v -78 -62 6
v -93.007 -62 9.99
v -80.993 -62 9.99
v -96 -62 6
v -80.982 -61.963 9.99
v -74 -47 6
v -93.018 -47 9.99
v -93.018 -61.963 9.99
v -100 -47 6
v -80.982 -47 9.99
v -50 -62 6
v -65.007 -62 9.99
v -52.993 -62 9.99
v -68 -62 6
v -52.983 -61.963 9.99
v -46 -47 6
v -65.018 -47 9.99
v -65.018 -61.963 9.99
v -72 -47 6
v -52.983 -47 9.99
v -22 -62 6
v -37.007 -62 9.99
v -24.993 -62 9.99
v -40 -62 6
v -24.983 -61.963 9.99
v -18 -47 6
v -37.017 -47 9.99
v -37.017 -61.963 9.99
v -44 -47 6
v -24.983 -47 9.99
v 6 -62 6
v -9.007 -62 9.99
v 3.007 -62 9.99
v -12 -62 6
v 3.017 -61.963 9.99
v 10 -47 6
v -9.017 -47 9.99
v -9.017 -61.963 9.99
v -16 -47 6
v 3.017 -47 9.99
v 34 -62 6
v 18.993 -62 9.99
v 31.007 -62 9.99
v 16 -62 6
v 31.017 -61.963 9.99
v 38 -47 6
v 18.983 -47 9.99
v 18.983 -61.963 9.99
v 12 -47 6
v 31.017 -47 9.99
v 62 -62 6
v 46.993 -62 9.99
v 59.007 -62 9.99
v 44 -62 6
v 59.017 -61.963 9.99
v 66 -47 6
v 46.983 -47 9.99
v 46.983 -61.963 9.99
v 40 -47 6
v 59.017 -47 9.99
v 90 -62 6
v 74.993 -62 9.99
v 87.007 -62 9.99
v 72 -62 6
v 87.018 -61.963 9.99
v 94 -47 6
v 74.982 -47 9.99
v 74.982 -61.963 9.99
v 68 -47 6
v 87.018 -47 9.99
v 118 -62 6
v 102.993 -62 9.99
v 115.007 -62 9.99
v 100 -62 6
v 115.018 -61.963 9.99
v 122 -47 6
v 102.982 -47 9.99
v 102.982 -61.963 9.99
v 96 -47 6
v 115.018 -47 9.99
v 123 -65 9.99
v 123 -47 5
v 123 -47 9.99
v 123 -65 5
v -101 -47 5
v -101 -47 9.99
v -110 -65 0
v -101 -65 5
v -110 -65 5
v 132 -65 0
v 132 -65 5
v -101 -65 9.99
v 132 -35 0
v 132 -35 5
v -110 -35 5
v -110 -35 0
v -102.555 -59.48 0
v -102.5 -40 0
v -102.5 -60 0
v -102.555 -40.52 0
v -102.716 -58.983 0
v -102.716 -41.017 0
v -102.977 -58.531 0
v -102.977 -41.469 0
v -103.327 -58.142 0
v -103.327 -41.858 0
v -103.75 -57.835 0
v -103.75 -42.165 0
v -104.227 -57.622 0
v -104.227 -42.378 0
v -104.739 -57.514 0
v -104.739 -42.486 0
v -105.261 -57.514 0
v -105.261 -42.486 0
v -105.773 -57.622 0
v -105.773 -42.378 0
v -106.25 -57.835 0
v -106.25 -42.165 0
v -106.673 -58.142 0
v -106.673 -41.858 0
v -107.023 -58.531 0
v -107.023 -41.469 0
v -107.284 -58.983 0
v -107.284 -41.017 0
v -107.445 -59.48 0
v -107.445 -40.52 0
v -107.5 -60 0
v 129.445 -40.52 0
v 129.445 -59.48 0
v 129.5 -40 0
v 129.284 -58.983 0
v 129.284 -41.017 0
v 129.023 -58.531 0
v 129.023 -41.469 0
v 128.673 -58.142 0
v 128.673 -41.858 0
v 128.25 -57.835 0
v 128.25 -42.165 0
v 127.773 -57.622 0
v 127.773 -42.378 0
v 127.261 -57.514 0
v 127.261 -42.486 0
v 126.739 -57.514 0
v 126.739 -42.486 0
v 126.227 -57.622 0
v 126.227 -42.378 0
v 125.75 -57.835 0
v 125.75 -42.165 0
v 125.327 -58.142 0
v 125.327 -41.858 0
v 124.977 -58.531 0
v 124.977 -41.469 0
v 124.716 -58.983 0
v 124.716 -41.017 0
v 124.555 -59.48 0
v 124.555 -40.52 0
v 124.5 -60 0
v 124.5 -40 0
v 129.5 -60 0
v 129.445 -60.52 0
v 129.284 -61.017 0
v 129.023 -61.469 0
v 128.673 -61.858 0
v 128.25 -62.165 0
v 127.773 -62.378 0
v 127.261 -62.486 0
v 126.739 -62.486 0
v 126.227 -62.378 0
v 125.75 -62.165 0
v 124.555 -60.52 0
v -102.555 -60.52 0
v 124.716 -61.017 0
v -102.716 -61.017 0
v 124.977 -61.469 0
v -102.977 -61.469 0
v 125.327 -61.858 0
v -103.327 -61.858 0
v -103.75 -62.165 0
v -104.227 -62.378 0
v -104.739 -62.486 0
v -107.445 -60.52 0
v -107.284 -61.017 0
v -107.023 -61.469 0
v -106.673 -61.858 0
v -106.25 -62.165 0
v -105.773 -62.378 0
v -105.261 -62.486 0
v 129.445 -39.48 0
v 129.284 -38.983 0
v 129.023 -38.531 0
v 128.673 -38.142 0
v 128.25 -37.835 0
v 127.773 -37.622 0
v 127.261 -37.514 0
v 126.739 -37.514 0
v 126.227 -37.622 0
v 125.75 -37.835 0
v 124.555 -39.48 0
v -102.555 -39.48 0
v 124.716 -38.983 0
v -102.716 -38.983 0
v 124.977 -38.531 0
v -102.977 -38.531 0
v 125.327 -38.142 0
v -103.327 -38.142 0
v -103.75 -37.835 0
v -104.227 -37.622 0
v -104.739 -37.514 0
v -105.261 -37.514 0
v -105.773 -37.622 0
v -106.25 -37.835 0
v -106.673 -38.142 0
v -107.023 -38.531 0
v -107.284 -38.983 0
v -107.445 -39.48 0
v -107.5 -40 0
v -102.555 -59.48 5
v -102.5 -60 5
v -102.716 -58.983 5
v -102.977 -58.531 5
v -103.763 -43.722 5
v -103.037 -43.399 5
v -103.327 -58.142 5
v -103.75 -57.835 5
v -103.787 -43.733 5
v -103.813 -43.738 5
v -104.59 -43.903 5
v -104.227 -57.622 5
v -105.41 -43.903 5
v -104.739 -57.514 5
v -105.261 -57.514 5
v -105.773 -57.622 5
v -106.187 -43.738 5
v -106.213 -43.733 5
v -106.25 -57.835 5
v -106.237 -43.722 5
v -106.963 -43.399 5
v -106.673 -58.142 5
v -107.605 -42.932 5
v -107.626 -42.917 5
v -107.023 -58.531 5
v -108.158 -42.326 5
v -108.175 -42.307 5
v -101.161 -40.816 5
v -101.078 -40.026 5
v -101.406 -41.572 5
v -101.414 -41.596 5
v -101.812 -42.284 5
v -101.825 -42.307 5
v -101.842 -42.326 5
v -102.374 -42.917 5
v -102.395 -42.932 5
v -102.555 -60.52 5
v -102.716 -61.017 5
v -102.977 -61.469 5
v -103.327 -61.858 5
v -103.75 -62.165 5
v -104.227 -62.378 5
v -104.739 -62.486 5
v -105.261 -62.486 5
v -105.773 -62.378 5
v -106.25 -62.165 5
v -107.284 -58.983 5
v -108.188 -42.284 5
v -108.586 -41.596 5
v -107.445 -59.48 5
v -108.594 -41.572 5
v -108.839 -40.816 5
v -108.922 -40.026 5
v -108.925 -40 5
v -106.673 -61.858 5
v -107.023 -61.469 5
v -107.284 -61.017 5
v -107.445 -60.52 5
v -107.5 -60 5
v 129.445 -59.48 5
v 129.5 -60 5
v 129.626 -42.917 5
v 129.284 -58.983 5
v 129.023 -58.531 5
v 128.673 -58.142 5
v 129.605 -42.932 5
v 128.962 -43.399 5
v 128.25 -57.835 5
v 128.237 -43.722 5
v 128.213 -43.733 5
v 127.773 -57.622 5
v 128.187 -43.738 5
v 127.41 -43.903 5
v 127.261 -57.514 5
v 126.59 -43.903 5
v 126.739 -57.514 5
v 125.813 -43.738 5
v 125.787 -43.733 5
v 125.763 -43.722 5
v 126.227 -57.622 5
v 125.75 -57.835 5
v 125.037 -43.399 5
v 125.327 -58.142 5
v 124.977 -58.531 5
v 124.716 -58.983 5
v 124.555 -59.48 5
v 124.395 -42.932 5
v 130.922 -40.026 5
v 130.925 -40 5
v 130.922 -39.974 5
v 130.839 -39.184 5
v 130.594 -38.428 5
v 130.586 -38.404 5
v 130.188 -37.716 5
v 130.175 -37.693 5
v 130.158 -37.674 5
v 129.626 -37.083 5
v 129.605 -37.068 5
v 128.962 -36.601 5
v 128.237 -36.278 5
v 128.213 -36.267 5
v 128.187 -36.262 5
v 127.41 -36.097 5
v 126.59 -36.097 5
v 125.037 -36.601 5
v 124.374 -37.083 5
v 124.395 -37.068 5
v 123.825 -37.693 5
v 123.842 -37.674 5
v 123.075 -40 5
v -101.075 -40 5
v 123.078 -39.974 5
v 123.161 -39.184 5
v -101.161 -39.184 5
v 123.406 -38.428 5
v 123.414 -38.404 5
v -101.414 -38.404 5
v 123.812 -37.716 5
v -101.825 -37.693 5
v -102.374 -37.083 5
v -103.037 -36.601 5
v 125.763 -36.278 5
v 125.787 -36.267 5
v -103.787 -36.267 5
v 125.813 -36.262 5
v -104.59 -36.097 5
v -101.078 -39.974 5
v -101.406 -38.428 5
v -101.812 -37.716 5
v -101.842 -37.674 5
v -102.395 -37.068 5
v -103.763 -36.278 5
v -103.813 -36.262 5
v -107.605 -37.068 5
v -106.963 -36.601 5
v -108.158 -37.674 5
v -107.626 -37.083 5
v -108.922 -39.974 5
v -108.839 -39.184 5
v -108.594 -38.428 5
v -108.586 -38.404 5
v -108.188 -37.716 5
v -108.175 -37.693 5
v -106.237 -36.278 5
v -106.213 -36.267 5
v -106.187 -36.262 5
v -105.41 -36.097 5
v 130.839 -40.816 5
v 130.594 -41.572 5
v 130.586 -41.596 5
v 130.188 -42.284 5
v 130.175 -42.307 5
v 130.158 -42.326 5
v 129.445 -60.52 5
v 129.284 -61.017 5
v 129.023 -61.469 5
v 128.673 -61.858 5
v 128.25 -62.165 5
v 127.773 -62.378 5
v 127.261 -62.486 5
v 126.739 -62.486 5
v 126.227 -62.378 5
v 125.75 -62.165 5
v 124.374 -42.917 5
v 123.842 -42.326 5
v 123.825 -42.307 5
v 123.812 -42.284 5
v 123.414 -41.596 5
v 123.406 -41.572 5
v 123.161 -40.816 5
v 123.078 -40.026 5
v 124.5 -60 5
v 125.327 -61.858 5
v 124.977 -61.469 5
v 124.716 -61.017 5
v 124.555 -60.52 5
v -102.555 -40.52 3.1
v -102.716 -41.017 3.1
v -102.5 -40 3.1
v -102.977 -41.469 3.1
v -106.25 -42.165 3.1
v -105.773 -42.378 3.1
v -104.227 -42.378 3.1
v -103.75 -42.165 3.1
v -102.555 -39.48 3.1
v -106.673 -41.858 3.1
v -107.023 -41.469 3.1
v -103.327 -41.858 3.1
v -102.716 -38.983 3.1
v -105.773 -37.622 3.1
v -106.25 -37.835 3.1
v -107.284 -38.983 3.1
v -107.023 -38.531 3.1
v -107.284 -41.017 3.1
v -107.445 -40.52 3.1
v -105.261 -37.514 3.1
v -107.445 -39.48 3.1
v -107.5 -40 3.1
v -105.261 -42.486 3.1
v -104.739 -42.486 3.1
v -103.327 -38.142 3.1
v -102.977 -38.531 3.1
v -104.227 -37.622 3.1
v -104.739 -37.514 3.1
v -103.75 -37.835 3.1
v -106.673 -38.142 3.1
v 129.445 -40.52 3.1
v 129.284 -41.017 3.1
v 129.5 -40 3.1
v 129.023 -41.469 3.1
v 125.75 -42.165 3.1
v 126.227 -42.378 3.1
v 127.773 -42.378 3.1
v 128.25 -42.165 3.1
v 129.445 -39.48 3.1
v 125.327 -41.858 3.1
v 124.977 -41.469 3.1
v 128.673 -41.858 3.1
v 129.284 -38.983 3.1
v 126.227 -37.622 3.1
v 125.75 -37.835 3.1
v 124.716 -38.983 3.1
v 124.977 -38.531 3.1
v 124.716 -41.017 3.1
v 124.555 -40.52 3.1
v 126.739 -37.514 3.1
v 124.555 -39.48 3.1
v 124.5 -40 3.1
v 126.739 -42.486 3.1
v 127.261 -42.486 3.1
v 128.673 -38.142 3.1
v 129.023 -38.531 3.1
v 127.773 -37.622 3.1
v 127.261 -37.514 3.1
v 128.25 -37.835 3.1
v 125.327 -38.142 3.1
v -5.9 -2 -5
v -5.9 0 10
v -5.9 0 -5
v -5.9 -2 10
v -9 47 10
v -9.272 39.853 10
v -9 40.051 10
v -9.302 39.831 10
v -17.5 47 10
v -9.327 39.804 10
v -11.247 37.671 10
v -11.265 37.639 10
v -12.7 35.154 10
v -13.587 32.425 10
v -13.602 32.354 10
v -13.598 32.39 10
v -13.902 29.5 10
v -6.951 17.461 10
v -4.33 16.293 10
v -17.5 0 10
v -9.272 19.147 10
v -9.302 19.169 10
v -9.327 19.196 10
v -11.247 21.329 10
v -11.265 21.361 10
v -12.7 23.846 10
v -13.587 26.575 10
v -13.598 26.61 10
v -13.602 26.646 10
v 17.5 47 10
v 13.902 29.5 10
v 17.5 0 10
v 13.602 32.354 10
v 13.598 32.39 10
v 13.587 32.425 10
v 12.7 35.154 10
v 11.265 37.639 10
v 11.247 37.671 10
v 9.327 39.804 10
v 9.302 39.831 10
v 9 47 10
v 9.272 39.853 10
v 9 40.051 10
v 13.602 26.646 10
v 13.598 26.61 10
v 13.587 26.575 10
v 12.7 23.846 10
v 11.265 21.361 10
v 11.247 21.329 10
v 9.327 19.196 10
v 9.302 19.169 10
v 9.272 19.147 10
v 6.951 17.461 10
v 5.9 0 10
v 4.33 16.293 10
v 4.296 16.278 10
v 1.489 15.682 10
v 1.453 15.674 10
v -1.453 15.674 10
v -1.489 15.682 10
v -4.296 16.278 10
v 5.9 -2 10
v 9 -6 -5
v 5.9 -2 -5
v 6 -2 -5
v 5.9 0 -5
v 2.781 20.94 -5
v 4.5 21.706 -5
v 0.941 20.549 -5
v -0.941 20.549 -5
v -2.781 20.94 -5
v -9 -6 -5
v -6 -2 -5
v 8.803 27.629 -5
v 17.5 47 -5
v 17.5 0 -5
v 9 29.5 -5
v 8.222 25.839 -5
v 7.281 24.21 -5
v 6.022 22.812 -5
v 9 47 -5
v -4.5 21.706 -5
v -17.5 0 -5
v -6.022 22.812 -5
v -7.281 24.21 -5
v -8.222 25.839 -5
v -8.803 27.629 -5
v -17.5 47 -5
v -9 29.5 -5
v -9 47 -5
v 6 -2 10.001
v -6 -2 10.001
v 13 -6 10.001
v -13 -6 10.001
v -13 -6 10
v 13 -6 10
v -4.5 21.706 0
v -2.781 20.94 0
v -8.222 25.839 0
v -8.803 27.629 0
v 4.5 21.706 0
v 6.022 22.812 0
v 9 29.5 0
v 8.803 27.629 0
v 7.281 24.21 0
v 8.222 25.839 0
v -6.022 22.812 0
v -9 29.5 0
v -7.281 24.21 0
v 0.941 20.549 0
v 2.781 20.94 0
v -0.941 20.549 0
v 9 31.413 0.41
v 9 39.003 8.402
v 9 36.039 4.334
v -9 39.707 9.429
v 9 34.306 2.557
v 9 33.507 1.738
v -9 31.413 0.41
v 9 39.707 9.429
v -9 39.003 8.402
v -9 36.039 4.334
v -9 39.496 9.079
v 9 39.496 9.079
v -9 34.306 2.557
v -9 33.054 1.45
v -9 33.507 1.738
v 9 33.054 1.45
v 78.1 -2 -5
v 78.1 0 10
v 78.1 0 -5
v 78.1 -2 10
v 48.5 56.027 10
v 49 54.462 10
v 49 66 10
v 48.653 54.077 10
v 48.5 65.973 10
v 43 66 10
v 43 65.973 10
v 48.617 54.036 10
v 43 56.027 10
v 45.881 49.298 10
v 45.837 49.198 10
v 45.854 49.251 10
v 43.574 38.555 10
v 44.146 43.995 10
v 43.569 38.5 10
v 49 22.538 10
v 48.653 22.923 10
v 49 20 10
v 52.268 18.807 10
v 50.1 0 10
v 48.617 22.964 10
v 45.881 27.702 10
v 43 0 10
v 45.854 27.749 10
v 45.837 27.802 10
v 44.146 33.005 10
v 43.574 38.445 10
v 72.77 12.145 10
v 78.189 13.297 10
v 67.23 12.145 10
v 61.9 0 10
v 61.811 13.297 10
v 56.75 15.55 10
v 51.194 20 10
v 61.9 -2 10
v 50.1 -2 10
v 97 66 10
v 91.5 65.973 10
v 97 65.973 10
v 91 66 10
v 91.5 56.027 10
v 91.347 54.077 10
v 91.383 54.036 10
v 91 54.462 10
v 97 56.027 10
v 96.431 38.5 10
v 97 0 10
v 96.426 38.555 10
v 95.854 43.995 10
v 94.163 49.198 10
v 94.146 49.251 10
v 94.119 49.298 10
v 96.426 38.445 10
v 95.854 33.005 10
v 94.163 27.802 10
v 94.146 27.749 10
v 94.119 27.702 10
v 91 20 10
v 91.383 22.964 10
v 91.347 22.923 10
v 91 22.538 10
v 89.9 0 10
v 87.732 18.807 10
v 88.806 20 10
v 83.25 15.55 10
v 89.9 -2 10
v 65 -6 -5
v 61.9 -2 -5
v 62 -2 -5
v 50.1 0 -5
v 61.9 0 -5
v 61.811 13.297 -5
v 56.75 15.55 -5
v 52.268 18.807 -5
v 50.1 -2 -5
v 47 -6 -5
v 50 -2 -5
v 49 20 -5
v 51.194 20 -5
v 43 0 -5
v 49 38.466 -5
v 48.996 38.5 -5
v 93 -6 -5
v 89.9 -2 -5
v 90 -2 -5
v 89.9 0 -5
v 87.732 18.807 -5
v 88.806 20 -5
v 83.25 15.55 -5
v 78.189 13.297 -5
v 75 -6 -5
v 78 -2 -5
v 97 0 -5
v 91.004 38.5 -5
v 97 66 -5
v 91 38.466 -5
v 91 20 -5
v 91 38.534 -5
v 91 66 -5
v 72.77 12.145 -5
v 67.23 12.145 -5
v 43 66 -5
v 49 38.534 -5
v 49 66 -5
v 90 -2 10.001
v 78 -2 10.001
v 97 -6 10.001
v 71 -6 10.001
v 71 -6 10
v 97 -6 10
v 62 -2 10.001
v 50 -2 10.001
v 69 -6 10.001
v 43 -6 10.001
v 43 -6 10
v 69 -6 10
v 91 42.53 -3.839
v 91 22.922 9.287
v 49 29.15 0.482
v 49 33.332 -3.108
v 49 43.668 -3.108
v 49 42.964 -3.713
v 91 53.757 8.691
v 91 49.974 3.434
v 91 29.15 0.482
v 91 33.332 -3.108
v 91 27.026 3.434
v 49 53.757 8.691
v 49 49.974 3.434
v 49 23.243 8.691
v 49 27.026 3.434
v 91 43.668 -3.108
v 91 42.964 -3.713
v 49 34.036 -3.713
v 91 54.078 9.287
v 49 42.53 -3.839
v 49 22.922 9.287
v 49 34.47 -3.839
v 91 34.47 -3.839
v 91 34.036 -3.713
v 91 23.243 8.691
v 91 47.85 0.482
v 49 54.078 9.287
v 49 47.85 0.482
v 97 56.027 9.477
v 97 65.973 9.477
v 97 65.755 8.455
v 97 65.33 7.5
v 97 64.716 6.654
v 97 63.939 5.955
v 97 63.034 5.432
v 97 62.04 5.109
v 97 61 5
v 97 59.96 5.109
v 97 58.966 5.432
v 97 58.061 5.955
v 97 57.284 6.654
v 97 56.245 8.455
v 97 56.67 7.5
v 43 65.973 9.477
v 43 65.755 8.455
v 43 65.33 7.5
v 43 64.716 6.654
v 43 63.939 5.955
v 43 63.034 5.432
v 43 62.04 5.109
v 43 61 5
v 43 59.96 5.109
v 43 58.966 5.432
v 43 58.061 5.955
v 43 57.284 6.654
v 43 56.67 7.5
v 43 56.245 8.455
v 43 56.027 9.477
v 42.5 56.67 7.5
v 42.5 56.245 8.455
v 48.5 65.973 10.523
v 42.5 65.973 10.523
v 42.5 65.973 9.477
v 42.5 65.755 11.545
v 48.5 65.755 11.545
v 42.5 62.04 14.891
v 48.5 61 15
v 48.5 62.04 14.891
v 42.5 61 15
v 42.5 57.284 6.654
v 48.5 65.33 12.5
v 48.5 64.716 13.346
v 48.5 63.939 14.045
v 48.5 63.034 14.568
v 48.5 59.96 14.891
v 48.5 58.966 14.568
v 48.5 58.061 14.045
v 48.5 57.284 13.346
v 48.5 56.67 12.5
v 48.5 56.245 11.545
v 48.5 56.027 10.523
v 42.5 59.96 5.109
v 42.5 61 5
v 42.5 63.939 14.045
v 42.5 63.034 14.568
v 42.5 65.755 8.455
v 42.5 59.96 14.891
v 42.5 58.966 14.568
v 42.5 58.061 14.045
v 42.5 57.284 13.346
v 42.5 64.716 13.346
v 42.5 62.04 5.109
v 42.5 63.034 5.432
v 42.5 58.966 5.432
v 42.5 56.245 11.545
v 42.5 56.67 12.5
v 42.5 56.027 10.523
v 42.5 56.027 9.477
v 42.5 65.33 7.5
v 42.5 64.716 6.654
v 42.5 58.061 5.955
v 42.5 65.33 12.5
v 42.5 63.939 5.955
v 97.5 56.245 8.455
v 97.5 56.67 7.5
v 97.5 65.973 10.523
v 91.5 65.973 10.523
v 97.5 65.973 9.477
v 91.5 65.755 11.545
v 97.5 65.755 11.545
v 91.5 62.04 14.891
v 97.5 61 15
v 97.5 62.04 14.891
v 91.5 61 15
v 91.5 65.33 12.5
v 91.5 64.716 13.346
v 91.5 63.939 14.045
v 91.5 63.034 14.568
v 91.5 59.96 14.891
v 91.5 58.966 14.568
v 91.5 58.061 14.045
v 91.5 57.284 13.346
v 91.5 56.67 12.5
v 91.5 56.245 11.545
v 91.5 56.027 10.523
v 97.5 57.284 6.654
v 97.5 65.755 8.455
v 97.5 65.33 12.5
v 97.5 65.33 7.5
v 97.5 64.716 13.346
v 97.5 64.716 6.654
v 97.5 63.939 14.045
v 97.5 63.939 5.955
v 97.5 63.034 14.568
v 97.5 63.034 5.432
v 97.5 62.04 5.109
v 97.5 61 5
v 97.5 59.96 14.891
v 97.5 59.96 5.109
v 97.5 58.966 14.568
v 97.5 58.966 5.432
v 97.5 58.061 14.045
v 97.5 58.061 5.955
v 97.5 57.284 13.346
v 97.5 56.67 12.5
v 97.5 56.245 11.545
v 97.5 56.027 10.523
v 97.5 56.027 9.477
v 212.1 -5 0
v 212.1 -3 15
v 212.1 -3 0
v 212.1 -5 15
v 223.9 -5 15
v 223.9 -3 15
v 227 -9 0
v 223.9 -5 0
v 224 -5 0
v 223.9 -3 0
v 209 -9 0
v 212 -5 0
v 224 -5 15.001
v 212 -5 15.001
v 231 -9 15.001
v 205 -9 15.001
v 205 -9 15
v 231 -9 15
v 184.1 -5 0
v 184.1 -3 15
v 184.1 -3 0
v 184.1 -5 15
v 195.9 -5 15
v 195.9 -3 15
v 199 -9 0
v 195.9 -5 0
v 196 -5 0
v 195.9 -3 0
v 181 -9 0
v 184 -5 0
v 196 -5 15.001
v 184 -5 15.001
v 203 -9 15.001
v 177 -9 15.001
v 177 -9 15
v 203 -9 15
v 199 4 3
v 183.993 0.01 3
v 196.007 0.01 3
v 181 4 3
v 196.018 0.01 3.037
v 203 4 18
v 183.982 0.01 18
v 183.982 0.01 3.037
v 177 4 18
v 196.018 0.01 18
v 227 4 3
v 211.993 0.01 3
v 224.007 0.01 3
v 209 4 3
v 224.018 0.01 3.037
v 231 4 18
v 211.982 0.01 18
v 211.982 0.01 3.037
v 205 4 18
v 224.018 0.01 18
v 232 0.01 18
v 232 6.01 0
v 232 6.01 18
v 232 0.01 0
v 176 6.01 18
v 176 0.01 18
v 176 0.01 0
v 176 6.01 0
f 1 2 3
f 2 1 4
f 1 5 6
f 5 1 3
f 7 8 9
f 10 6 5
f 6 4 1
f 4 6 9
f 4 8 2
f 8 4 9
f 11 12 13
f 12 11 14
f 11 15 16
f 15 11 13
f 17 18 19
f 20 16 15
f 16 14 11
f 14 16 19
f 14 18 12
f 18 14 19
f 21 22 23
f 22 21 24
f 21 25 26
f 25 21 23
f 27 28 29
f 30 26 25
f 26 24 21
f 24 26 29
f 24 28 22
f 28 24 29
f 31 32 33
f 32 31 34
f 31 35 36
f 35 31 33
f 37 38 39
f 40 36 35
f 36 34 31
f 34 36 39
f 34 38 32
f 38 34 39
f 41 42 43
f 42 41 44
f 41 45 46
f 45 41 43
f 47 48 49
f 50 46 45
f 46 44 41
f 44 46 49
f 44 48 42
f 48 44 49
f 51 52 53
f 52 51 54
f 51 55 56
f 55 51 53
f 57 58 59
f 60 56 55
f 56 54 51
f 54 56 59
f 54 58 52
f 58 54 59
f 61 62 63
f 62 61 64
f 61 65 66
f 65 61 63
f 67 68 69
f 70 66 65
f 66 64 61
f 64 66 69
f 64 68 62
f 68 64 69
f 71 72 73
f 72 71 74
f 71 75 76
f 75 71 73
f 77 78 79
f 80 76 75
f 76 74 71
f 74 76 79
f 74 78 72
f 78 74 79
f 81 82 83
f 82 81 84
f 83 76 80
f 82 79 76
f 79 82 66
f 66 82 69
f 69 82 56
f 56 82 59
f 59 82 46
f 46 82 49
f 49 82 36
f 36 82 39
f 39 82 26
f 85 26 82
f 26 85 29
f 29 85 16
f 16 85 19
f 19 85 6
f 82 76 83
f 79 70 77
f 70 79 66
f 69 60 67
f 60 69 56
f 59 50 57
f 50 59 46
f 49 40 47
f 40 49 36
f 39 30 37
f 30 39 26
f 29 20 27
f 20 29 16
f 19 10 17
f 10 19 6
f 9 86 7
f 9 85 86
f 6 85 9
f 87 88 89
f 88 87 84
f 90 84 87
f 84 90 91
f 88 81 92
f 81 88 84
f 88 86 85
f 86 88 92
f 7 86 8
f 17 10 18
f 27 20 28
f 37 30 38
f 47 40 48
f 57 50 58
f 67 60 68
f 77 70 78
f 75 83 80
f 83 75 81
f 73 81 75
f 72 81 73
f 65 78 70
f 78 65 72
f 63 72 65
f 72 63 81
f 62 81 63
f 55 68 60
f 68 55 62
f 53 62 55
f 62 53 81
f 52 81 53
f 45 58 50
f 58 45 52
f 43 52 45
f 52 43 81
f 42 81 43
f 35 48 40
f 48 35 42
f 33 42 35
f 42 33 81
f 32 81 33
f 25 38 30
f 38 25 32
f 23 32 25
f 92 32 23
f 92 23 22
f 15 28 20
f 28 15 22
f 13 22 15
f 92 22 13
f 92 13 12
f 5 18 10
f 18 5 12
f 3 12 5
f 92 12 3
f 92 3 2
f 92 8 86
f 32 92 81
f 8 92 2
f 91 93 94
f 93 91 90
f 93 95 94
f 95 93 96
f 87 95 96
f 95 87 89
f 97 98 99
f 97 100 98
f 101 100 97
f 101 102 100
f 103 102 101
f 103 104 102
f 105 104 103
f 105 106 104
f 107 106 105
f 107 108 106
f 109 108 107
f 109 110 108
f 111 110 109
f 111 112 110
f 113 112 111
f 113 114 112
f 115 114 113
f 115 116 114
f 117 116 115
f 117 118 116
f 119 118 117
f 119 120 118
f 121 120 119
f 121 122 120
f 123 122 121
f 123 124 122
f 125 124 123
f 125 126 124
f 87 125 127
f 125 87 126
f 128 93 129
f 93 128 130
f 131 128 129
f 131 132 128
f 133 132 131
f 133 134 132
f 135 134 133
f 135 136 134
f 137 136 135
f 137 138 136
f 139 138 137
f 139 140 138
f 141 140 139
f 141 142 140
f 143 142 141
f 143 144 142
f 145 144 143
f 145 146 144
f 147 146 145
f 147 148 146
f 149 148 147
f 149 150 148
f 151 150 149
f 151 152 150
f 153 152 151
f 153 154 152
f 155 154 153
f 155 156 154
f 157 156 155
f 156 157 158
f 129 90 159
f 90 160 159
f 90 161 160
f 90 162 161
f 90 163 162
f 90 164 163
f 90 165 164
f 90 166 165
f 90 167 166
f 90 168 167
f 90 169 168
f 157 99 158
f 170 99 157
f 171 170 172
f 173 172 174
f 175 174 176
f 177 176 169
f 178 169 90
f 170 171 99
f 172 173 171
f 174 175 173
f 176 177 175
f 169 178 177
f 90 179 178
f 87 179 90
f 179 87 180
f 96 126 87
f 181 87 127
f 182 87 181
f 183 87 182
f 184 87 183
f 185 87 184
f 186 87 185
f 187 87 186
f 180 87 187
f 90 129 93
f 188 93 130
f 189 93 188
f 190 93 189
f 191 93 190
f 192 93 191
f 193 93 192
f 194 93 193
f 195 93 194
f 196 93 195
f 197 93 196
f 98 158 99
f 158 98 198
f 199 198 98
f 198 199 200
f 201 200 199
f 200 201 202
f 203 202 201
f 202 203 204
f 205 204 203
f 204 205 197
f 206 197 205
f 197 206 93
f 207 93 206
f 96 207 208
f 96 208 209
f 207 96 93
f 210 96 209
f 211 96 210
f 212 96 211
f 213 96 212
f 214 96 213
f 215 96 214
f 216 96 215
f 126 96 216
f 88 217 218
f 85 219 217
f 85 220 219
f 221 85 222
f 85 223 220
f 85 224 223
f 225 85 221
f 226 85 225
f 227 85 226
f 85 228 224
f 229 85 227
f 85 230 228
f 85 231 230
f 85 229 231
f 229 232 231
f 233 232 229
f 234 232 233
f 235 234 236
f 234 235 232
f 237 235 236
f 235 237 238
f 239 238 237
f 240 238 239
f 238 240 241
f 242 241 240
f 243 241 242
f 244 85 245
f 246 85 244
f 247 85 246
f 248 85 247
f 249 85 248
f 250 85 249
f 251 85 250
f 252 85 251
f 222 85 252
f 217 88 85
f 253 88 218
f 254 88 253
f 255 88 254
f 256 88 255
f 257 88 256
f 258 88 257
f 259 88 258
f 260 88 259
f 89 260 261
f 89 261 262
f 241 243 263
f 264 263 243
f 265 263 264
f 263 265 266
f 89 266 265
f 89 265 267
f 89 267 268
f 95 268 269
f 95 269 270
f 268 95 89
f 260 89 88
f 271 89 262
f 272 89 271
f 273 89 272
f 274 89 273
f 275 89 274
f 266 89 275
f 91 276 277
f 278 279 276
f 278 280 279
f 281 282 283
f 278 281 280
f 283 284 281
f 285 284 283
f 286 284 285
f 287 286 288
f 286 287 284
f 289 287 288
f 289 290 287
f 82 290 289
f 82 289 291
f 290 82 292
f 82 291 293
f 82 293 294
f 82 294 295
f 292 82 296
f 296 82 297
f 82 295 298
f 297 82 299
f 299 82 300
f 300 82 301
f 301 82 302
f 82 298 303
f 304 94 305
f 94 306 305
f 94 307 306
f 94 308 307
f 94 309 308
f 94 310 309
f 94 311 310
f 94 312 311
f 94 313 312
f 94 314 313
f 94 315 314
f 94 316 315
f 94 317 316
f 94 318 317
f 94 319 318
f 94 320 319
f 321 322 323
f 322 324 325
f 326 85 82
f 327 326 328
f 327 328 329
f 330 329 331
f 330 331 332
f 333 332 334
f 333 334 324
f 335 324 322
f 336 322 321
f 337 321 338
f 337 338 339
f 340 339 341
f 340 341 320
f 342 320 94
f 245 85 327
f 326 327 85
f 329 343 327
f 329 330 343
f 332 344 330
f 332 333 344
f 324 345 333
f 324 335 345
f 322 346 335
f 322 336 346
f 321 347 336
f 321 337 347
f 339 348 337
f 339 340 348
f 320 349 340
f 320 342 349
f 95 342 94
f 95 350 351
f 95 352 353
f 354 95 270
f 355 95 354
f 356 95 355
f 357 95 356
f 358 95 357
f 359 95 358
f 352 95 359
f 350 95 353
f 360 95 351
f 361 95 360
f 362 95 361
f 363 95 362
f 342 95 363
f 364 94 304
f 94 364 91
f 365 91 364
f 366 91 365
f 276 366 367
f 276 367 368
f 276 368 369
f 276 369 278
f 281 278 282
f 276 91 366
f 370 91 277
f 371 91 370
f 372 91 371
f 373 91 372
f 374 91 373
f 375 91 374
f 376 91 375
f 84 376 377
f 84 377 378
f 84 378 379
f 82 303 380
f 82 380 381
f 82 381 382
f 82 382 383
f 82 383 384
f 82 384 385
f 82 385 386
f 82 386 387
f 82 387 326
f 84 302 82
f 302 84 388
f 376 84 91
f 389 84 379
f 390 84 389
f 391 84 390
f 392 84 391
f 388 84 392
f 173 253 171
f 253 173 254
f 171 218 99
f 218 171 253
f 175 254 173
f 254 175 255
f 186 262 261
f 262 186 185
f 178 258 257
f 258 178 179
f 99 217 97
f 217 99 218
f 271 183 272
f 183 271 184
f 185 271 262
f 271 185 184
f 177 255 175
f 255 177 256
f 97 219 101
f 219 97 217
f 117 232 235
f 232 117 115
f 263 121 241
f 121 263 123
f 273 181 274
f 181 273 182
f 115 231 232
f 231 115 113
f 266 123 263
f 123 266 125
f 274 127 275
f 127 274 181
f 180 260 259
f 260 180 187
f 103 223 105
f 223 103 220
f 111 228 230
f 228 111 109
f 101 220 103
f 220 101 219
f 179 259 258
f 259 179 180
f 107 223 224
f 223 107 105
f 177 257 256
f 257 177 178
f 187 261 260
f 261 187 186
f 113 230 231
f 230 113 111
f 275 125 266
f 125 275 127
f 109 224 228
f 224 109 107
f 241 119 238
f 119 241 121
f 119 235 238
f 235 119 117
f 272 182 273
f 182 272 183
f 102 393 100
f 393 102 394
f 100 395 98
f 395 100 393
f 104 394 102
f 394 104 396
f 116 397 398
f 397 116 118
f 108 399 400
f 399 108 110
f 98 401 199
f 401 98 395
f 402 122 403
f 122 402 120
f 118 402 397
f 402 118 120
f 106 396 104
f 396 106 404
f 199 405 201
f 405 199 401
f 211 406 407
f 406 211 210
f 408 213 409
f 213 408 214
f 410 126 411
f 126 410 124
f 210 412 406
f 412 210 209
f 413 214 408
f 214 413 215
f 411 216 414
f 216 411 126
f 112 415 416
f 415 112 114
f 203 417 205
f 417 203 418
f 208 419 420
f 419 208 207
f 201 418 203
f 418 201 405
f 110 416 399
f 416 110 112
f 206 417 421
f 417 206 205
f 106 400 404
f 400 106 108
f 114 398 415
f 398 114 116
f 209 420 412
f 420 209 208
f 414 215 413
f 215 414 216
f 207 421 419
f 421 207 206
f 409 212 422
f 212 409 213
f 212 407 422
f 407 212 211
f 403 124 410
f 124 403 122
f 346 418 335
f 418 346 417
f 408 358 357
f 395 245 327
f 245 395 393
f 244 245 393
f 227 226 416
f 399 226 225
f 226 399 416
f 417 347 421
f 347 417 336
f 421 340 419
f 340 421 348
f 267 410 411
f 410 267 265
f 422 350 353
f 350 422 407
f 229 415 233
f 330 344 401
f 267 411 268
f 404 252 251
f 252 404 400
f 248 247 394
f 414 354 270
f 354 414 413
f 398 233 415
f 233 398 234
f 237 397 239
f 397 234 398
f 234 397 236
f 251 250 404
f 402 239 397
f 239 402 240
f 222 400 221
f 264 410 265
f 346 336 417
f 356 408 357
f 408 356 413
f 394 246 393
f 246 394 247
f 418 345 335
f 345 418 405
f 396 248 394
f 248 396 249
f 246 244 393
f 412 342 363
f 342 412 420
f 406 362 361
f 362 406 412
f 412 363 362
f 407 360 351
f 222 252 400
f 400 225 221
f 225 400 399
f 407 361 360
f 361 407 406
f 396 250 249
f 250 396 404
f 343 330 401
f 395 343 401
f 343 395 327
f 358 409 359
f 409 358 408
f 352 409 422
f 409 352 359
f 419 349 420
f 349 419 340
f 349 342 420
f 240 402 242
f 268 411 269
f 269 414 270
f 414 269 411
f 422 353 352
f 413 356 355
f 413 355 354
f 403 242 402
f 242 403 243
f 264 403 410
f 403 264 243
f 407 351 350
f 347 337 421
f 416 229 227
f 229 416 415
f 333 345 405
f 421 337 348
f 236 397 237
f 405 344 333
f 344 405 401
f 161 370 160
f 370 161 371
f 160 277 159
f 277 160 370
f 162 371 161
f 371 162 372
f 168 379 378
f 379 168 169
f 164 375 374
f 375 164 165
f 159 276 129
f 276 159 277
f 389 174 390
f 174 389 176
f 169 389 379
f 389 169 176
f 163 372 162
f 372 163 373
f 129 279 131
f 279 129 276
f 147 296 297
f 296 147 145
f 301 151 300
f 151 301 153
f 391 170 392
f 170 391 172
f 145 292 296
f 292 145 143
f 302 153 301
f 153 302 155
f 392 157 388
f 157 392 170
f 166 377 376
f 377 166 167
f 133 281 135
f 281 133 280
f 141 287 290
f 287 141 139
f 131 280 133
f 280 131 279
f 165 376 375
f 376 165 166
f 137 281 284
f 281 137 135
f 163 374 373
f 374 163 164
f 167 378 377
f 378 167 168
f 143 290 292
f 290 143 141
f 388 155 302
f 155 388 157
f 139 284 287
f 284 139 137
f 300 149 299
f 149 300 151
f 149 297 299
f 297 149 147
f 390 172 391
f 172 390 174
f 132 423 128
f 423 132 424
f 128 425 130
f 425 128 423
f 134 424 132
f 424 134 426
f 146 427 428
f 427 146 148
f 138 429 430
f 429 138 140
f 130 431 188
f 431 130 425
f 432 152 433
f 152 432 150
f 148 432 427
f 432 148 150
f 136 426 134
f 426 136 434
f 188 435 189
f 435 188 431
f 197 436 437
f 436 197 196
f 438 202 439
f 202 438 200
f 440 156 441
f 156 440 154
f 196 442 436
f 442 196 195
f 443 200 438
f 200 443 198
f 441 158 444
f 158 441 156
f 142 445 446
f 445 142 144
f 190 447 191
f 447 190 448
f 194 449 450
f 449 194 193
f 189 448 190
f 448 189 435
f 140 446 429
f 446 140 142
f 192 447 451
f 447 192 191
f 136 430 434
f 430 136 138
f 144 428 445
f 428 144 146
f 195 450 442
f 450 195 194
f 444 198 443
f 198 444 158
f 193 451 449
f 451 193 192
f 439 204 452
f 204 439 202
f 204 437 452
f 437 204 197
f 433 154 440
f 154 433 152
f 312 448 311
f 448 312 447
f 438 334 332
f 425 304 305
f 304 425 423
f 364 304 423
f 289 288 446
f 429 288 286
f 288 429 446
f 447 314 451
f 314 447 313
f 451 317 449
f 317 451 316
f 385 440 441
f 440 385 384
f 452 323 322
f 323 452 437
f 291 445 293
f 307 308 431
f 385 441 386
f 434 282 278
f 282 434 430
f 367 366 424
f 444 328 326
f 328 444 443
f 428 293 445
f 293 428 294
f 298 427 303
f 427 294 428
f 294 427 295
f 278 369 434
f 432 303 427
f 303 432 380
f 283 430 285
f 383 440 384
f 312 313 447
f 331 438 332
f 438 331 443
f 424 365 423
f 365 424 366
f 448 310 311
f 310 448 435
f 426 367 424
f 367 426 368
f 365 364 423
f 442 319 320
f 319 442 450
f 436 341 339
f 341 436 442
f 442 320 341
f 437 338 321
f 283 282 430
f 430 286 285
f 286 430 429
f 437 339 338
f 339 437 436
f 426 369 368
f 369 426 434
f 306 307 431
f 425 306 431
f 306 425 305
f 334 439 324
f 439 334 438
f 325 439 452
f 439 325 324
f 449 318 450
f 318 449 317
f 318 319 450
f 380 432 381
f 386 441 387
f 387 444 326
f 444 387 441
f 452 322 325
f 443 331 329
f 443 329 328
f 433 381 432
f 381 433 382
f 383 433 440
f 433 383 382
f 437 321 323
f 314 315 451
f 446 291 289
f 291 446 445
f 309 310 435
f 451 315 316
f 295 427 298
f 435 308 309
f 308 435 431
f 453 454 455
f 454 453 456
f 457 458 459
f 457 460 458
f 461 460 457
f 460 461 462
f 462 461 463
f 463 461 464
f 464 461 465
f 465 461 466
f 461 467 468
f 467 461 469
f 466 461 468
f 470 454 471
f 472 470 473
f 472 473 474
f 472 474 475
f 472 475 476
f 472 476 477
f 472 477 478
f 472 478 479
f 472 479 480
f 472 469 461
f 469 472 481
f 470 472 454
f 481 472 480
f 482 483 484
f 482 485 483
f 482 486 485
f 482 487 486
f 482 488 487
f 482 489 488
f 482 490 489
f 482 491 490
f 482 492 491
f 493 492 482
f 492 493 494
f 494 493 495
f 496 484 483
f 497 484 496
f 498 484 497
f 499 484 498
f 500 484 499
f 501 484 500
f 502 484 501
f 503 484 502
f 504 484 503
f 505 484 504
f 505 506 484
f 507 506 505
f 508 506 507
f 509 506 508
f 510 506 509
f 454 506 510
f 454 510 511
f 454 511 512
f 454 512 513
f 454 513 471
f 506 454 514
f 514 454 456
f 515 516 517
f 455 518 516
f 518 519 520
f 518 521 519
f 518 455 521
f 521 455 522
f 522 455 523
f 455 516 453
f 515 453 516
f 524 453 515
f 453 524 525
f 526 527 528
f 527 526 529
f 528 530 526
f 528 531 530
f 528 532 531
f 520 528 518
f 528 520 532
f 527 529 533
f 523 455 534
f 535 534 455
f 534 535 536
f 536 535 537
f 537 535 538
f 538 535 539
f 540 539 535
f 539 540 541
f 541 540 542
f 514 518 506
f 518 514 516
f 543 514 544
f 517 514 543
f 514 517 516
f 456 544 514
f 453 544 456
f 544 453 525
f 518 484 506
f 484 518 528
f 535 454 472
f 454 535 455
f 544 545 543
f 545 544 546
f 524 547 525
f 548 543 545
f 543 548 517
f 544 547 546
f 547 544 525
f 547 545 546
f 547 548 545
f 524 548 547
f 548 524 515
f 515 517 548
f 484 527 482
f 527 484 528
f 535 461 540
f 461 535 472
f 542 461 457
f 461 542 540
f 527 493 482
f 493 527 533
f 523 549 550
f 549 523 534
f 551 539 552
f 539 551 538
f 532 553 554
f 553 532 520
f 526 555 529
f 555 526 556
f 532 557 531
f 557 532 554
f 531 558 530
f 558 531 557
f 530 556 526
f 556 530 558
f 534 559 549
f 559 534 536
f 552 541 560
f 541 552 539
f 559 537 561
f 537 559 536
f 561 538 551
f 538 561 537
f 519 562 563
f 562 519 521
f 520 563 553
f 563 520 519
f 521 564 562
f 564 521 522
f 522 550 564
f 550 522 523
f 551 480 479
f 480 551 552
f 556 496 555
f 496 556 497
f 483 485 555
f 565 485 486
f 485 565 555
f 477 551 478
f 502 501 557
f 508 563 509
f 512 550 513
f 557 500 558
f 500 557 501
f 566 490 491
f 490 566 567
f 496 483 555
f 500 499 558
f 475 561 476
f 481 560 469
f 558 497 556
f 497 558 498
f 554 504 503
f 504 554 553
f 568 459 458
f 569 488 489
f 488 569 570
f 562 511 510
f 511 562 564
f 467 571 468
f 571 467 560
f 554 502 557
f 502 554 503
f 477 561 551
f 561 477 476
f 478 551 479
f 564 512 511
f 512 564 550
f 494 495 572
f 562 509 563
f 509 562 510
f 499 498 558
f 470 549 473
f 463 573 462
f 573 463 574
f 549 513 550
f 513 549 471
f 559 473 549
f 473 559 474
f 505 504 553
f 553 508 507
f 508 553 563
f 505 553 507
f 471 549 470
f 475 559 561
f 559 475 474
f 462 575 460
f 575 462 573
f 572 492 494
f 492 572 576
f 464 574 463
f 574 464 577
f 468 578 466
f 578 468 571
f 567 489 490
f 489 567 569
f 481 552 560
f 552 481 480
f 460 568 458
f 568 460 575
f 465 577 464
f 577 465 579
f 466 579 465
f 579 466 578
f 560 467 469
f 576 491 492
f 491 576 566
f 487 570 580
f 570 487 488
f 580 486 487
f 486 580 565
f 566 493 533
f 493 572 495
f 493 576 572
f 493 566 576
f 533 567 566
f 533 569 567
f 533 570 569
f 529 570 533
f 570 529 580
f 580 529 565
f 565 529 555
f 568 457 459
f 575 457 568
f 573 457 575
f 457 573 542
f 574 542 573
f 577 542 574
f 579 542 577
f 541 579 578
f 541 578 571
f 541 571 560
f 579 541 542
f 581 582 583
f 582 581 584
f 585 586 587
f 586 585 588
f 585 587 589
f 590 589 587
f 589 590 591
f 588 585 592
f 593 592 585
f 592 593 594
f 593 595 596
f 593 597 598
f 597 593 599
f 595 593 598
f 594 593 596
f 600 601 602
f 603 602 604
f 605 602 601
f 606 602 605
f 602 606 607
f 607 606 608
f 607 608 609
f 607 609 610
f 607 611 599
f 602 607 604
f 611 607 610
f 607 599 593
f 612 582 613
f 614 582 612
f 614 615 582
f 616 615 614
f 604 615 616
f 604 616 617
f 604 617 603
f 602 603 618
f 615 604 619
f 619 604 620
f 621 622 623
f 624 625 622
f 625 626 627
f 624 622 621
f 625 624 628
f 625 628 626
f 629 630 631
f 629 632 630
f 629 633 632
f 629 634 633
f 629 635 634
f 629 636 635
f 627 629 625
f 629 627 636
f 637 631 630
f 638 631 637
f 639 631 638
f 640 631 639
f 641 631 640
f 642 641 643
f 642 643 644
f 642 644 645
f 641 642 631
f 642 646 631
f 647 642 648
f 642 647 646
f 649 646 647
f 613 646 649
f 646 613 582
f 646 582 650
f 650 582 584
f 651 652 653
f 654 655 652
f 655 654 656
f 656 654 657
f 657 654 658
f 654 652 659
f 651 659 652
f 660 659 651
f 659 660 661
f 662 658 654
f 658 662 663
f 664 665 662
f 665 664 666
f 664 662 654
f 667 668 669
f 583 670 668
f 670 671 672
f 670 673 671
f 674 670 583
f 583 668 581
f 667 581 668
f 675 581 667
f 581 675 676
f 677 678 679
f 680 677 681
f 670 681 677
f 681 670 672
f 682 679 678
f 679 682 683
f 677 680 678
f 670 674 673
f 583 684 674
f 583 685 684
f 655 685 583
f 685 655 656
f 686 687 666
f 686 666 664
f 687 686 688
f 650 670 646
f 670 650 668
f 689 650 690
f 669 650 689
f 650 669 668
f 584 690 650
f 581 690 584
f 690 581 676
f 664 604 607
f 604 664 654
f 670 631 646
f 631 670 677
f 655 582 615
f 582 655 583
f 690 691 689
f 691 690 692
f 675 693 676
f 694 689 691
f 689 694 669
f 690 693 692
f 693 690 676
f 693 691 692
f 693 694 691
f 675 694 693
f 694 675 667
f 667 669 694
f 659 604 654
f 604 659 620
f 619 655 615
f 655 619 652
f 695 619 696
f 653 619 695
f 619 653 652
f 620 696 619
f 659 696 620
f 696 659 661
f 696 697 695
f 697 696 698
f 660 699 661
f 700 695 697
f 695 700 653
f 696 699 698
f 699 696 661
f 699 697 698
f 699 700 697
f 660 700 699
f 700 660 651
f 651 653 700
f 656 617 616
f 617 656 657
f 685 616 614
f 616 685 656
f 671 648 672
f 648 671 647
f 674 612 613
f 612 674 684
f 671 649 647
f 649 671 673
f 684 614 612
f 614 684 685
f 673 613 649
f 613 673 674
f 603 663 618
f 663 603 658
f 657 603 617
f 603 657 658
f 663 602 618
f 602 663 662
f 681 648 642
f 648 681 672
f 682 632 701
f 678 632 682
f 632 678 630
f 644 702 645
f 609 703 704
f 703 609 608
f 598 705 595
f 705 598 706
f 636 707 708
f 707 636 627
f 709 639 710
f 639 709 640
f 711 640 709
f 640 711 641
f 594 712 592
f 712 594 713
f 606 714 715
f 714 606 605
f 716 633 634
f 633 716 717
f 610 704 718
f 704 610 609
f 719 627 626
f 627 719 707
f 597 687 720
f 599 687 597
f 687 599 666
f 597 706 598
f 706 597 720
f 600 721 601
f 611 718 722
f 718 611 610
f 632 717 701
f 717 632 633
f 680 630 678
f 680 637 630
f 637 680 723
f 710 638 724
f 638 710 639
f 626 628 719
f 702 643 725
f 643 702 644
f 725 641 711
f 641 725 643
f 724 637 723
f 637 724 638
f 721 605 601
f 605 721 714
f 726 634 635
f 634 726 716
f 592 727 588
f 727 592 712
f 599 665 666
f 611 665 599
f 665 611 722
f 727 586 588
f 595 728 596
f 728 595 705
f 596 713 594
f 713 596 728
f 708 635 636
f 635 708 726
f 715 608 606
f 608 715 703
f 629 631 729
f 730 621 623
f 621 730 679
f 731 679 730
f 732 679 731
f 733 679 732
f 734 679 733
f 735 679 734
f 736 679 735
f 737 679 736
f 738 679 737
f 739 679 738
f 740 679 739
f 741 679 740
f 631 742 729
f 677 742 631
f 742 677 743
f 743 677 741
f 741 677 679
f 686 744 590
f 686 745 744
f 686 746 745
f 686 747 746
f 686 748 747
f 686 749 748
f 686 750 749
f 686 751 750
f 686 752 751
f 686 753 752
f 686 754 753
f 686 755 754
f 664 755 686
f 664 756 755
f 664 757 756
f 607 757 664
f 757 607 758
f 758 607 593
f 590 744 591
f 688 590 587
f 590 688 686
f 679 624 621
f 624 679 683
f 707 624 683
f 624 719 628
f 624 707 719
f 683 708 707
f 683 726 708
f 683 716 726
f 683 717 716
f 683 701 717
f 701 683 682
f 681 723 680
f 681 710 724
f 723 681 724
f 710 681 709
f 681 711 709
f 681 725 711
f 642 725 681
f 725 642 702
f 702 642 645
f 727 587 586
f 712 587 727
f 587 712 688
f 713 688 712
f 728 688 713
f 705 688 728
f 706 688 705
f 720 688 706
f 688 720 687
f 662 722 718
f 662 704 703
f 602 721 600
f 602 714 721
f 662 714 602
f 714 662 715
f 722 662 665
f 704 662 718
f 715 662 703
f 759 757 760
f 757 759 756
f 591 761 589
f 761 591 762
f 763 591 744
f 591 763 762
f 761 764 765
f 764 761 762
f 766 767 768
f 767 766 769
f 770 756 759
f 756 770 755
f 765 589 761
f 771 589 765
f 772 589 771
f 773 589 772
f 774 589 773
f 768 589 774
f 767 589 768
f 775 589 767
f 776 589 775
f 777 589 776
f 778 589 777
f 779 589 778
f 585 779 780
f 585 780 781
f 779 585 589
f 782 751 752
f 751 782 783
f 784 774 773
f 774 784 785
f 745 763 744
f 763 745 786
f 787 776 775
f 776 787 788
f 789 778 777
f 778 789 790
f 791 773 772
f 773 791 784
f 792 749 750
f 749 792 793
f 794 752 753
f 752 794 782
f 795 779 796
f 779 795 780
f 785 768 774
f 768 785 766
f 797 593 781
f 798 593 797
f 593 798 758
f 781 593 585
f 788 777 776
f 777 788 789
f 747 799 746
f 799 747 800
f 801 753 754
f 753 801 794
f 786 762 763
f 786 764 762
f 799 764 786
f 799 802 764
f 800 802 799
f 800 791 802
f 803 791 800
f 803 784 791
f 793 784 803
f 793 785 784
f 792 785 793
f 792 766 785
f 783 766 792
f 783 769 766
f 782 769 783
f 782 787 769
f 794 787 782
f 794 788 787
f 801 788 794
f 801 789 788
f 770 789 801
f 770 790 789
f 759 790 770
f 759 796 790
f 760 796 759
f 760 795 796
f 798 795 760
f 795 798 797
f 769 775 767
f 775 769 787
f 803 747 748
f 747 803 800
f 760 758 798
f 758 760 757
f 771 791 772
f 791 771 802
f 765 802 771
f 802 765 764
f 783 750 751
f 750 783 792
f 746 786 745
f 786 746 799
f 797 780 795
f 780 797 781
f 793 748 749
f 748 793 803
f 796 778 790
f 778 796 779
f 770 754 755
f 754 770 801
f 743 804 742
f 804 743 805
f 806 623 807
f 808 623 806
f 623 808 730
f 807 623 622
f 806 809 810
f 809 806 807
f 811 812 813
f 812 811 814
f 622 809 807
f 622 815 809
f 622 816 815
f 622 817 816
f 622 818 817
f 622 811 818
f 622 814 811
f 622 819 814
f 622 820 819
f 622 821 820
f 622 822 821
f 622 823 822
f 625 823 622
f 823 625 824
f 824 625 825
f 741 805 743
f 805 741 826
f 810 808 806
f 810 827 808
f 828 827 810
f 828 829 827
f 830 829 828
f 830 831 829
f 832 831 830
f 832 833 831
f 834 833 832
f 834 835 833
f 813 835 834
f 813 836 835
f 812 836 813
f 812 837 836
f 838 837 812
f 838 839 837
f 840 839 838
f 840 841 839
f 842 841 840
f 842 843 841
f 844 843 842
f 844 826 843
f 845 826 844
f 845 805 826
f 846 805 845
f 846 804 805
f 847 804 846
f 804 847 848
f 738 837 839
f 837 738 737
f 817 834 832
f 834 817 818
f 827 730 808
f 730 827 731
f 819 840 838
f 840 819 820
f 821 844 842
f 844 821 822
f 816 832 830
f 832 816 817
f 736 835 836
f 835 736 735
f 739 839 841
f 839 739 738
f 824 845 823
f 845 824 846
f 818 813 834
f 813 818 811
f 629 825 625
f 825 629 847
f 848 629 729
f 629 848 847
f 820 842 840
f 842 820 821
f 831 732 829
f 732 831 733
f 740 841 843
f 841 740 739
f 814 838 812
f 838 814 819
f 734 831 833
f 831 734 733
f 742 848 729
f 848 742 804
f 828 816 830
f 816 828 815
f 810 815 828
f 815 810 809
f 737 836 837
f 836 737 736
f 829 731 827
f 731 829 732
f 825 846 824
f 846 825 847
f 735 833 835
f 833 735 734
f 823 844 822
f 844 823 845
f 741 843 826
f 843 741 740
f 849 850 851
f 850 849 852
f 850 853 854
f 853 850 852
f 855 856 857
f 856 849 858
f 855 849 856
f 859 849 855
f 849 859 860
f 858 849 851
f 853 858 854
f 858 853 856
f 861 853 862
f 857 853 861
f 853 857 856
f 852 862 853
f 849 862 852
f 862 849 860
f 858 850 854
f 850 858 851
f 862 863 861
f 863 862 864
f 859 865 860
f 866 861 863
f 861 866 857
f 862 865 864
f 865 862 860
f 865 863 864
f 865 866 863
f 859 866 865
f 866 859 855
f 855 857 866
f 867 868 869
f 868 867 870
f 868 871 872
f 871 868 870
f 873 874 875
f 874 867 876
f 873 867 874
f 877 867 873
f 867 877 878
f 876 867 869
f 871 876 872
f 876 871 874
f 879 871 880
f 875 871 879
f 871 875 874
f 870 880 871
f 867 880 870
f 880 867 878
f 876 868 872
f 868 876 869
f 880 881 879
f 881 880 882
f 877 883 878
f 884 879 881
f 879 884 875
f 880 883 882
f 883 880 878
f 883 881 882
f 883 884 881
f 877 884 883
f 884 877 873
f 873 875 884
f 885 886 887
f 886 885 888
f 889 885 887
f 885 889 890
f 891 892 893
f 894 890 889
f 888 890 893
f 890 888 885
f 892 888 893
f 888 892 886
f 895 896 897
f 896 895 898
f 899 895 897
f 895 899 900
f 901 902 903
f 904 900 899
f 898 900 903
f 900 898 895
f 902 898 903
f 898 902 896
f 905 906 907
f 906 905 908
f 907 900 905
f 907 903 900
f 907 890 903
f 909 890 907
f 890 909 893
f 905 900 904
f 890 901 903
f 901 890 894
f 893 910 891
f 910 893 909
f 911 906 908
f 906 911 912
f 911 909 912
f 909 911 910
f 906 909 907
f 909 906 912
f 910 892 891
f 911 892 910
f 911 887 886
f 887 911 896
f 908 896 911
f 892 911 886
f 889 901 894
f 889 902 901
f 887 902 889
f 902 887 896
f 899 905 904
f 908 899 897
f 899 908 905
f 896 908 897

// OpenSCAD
// Hand Blender Wall-Mount
// Designed for a Koios Blender

$fn=30;

tailOuterWidth=20+2*4;

if (1){
    translate([-110,-70,5]) 
        rotate([-90,0,0])
            backPlane();

//    rotate([0,180,0]) 
    {
        translate([0,0,-5])     holderClamp(type="mixer");
        translate([70,0,-5])    holderClampMotor(type="motor");
    }
}


testDoveTail=1;
if ( testDoveTail){
    translate([190,-0,0]){
        translate([0,0,10])
//        rotate([0,180,0]) // For printing
          rotate([0,0,180]) // For printing
        translate([-28,5,-10])
            doveTail(count=2);

            doveTailWallPart(count=2);
}
}

// ==================================================================================================

module backPlane(){
    count=8;
    tailWidth=tailOuterWidth;
    screwDistFromBorder=5;
    dScrew=5;
    posFirst=screwDistFromBorder+4;
    bracketWidth=count*tailWidth+ (2*(posFirst));
    bracketHeight=30;
    bracketThickness=5;
    
    translate([0,0,bracketThickness]){
        difference(){
            union(){
                cube([bracketWidth,bracketThickness,bracketHeight]);
                    translate([posFirst + tailWidth/2,-5,0])
                        doveTailWallPart(tailWidth=bracketWidth,count=count);
            }

            // Screw Holes
            for (x=[screwDistFromBorder,bracketWidth-screwDistFromBorder])
                for (z=[screwDistFromBorder,bracketHeight-screwDistFromBorder])
                    translate([x,z>screwDistFromBorder?-.1:-5,z]){
                        rotate([270,0,0])
                            union(){
                                cylinder(d=dScrew,h=20);
                                translate([0,0,0]) cylinder(d1=dScrew+3,d2=dScrew,h=2);
                            }
                    }
                }
            }
            
}


module holderClampMotor(){
    
    translate([tailOuterWidth/2,-2,0])
        rotate([0,0,180])
            doveTail(count=2);

        motorDiameter=53;
        innerDiameter=42;
        outerDiameter=54;
        
        stegLength=12;
        translate(outerDiameter*[-.5,0,0]+[0,0,0])
            color("blue")
                cube([outerDiameter,stegLength,15]);

        translate([0,stegLength,0])
            difference(){
                translate(outerDiameter*[-.5,0,0])
                    cube([outerDiameter,outerDiameter,15]);

                translate([0,+motorDiameter/2,-.01])
                    difference(){
                        cylinder(d=motorDiameter,h=15+.2);
                        translate([-30,-motorDiameter/2+8,-.1]) cube([60,motorDiameter,20]);
                    }

                translate([0,+motorDiameter/2,-.01])
                    difference(){
                        cylinder(d1=innerDiameter,d2=motorDiameter,h=15+.2);
                        translate([-30,-motorDiameter*1.5+8,-.1]) cube([60,motorDiameter,20]);
                    }
                            
//#                    translate([0,innerDiameter/2+5,-.01]) cylinder(d=innerDiameter,h=5+.2);


                    translate(innerDiameter*[-.5,0,0]+[0,8,-.1])
                         cube([innerDiameter,motorDiameter,15+.2]);
            }
            
            for (x=[-motorDiameter/2+4,motorDiameter/2]){
                translate([x+1,motorDiameter+8,15])
                    rotate([0,-90,0])
                        cylinder(d=10,h=6);
            }    
        }


module holderClamp(type="mixer"){
    
    translate([0,-2,0])
        rotate([0,0,180])
            doveTail(count=1);
            
        if(type=="mixer"){
            outerDiameter=35;

    
            stegLength=12;
            translate(outerDiameter*[-.5,0,0]+[0,0,0])
                color("blue")
                    cube([outerDiameter,stegLength,15]);


            translate([0,stegLength+outerDiameter/2,0]){
                difference(){
                    translate(outerDiameter*[-.5,-.5,0])
                        cube([outerDiameter,outerDiameter,15]);

                        innerDiameter=18;
                        translate([0,0,-.01])
                            cylinder(d=innerDiameter,h=15+.2);

                        translate([0,0,5])
                            cylinder(d1=innerDiameter,d2=innerDiameter+10,h=10+.2);

                        translate(innerDiameter*[-.5,0,-.01])
                            cube([innerDiameter,innerDiameter,15+.2]);
                }
        }
    }
}



// ==================================================================================================

module doveTailWallPart(count=1){
    difference(){
        translate([-tailOuterWidth/2,.01,0]) cube([tailOuterWidth*count,6,15+3]);
        translate([0,0,3])         doveTail(count=count);
    }
}
    
module doveTail(
    tailLength=4,
    tailWidth=12,
    tailHeight=15,
    count=1
    ) {
    
    x0=tailWidth/2;
    x1=tailWidth/2 +3;
    xd=4;

    attachmentThickness=2;
        
    for( i=[0:count-1] ) {
        translate([ tailOuterWidth*i ,0,0])
        union(){
            translate([-x0+.1,-attachmentThickness,0])  cube([2*x0-.2,attachmentThickness,tailHeight]);

            hull()
                for(z=[0,1])
                    translate([0,0,z*tailHeight])
                       linear_extrude(.001){
                            polygon([
                                [-x0, 0], 
                                [-x1-z*xd, tailLength],
                                [x1+z*xd, tailLength],
                                [x0, 0]
                            ]);
                       }
                   }
           }
}
    
